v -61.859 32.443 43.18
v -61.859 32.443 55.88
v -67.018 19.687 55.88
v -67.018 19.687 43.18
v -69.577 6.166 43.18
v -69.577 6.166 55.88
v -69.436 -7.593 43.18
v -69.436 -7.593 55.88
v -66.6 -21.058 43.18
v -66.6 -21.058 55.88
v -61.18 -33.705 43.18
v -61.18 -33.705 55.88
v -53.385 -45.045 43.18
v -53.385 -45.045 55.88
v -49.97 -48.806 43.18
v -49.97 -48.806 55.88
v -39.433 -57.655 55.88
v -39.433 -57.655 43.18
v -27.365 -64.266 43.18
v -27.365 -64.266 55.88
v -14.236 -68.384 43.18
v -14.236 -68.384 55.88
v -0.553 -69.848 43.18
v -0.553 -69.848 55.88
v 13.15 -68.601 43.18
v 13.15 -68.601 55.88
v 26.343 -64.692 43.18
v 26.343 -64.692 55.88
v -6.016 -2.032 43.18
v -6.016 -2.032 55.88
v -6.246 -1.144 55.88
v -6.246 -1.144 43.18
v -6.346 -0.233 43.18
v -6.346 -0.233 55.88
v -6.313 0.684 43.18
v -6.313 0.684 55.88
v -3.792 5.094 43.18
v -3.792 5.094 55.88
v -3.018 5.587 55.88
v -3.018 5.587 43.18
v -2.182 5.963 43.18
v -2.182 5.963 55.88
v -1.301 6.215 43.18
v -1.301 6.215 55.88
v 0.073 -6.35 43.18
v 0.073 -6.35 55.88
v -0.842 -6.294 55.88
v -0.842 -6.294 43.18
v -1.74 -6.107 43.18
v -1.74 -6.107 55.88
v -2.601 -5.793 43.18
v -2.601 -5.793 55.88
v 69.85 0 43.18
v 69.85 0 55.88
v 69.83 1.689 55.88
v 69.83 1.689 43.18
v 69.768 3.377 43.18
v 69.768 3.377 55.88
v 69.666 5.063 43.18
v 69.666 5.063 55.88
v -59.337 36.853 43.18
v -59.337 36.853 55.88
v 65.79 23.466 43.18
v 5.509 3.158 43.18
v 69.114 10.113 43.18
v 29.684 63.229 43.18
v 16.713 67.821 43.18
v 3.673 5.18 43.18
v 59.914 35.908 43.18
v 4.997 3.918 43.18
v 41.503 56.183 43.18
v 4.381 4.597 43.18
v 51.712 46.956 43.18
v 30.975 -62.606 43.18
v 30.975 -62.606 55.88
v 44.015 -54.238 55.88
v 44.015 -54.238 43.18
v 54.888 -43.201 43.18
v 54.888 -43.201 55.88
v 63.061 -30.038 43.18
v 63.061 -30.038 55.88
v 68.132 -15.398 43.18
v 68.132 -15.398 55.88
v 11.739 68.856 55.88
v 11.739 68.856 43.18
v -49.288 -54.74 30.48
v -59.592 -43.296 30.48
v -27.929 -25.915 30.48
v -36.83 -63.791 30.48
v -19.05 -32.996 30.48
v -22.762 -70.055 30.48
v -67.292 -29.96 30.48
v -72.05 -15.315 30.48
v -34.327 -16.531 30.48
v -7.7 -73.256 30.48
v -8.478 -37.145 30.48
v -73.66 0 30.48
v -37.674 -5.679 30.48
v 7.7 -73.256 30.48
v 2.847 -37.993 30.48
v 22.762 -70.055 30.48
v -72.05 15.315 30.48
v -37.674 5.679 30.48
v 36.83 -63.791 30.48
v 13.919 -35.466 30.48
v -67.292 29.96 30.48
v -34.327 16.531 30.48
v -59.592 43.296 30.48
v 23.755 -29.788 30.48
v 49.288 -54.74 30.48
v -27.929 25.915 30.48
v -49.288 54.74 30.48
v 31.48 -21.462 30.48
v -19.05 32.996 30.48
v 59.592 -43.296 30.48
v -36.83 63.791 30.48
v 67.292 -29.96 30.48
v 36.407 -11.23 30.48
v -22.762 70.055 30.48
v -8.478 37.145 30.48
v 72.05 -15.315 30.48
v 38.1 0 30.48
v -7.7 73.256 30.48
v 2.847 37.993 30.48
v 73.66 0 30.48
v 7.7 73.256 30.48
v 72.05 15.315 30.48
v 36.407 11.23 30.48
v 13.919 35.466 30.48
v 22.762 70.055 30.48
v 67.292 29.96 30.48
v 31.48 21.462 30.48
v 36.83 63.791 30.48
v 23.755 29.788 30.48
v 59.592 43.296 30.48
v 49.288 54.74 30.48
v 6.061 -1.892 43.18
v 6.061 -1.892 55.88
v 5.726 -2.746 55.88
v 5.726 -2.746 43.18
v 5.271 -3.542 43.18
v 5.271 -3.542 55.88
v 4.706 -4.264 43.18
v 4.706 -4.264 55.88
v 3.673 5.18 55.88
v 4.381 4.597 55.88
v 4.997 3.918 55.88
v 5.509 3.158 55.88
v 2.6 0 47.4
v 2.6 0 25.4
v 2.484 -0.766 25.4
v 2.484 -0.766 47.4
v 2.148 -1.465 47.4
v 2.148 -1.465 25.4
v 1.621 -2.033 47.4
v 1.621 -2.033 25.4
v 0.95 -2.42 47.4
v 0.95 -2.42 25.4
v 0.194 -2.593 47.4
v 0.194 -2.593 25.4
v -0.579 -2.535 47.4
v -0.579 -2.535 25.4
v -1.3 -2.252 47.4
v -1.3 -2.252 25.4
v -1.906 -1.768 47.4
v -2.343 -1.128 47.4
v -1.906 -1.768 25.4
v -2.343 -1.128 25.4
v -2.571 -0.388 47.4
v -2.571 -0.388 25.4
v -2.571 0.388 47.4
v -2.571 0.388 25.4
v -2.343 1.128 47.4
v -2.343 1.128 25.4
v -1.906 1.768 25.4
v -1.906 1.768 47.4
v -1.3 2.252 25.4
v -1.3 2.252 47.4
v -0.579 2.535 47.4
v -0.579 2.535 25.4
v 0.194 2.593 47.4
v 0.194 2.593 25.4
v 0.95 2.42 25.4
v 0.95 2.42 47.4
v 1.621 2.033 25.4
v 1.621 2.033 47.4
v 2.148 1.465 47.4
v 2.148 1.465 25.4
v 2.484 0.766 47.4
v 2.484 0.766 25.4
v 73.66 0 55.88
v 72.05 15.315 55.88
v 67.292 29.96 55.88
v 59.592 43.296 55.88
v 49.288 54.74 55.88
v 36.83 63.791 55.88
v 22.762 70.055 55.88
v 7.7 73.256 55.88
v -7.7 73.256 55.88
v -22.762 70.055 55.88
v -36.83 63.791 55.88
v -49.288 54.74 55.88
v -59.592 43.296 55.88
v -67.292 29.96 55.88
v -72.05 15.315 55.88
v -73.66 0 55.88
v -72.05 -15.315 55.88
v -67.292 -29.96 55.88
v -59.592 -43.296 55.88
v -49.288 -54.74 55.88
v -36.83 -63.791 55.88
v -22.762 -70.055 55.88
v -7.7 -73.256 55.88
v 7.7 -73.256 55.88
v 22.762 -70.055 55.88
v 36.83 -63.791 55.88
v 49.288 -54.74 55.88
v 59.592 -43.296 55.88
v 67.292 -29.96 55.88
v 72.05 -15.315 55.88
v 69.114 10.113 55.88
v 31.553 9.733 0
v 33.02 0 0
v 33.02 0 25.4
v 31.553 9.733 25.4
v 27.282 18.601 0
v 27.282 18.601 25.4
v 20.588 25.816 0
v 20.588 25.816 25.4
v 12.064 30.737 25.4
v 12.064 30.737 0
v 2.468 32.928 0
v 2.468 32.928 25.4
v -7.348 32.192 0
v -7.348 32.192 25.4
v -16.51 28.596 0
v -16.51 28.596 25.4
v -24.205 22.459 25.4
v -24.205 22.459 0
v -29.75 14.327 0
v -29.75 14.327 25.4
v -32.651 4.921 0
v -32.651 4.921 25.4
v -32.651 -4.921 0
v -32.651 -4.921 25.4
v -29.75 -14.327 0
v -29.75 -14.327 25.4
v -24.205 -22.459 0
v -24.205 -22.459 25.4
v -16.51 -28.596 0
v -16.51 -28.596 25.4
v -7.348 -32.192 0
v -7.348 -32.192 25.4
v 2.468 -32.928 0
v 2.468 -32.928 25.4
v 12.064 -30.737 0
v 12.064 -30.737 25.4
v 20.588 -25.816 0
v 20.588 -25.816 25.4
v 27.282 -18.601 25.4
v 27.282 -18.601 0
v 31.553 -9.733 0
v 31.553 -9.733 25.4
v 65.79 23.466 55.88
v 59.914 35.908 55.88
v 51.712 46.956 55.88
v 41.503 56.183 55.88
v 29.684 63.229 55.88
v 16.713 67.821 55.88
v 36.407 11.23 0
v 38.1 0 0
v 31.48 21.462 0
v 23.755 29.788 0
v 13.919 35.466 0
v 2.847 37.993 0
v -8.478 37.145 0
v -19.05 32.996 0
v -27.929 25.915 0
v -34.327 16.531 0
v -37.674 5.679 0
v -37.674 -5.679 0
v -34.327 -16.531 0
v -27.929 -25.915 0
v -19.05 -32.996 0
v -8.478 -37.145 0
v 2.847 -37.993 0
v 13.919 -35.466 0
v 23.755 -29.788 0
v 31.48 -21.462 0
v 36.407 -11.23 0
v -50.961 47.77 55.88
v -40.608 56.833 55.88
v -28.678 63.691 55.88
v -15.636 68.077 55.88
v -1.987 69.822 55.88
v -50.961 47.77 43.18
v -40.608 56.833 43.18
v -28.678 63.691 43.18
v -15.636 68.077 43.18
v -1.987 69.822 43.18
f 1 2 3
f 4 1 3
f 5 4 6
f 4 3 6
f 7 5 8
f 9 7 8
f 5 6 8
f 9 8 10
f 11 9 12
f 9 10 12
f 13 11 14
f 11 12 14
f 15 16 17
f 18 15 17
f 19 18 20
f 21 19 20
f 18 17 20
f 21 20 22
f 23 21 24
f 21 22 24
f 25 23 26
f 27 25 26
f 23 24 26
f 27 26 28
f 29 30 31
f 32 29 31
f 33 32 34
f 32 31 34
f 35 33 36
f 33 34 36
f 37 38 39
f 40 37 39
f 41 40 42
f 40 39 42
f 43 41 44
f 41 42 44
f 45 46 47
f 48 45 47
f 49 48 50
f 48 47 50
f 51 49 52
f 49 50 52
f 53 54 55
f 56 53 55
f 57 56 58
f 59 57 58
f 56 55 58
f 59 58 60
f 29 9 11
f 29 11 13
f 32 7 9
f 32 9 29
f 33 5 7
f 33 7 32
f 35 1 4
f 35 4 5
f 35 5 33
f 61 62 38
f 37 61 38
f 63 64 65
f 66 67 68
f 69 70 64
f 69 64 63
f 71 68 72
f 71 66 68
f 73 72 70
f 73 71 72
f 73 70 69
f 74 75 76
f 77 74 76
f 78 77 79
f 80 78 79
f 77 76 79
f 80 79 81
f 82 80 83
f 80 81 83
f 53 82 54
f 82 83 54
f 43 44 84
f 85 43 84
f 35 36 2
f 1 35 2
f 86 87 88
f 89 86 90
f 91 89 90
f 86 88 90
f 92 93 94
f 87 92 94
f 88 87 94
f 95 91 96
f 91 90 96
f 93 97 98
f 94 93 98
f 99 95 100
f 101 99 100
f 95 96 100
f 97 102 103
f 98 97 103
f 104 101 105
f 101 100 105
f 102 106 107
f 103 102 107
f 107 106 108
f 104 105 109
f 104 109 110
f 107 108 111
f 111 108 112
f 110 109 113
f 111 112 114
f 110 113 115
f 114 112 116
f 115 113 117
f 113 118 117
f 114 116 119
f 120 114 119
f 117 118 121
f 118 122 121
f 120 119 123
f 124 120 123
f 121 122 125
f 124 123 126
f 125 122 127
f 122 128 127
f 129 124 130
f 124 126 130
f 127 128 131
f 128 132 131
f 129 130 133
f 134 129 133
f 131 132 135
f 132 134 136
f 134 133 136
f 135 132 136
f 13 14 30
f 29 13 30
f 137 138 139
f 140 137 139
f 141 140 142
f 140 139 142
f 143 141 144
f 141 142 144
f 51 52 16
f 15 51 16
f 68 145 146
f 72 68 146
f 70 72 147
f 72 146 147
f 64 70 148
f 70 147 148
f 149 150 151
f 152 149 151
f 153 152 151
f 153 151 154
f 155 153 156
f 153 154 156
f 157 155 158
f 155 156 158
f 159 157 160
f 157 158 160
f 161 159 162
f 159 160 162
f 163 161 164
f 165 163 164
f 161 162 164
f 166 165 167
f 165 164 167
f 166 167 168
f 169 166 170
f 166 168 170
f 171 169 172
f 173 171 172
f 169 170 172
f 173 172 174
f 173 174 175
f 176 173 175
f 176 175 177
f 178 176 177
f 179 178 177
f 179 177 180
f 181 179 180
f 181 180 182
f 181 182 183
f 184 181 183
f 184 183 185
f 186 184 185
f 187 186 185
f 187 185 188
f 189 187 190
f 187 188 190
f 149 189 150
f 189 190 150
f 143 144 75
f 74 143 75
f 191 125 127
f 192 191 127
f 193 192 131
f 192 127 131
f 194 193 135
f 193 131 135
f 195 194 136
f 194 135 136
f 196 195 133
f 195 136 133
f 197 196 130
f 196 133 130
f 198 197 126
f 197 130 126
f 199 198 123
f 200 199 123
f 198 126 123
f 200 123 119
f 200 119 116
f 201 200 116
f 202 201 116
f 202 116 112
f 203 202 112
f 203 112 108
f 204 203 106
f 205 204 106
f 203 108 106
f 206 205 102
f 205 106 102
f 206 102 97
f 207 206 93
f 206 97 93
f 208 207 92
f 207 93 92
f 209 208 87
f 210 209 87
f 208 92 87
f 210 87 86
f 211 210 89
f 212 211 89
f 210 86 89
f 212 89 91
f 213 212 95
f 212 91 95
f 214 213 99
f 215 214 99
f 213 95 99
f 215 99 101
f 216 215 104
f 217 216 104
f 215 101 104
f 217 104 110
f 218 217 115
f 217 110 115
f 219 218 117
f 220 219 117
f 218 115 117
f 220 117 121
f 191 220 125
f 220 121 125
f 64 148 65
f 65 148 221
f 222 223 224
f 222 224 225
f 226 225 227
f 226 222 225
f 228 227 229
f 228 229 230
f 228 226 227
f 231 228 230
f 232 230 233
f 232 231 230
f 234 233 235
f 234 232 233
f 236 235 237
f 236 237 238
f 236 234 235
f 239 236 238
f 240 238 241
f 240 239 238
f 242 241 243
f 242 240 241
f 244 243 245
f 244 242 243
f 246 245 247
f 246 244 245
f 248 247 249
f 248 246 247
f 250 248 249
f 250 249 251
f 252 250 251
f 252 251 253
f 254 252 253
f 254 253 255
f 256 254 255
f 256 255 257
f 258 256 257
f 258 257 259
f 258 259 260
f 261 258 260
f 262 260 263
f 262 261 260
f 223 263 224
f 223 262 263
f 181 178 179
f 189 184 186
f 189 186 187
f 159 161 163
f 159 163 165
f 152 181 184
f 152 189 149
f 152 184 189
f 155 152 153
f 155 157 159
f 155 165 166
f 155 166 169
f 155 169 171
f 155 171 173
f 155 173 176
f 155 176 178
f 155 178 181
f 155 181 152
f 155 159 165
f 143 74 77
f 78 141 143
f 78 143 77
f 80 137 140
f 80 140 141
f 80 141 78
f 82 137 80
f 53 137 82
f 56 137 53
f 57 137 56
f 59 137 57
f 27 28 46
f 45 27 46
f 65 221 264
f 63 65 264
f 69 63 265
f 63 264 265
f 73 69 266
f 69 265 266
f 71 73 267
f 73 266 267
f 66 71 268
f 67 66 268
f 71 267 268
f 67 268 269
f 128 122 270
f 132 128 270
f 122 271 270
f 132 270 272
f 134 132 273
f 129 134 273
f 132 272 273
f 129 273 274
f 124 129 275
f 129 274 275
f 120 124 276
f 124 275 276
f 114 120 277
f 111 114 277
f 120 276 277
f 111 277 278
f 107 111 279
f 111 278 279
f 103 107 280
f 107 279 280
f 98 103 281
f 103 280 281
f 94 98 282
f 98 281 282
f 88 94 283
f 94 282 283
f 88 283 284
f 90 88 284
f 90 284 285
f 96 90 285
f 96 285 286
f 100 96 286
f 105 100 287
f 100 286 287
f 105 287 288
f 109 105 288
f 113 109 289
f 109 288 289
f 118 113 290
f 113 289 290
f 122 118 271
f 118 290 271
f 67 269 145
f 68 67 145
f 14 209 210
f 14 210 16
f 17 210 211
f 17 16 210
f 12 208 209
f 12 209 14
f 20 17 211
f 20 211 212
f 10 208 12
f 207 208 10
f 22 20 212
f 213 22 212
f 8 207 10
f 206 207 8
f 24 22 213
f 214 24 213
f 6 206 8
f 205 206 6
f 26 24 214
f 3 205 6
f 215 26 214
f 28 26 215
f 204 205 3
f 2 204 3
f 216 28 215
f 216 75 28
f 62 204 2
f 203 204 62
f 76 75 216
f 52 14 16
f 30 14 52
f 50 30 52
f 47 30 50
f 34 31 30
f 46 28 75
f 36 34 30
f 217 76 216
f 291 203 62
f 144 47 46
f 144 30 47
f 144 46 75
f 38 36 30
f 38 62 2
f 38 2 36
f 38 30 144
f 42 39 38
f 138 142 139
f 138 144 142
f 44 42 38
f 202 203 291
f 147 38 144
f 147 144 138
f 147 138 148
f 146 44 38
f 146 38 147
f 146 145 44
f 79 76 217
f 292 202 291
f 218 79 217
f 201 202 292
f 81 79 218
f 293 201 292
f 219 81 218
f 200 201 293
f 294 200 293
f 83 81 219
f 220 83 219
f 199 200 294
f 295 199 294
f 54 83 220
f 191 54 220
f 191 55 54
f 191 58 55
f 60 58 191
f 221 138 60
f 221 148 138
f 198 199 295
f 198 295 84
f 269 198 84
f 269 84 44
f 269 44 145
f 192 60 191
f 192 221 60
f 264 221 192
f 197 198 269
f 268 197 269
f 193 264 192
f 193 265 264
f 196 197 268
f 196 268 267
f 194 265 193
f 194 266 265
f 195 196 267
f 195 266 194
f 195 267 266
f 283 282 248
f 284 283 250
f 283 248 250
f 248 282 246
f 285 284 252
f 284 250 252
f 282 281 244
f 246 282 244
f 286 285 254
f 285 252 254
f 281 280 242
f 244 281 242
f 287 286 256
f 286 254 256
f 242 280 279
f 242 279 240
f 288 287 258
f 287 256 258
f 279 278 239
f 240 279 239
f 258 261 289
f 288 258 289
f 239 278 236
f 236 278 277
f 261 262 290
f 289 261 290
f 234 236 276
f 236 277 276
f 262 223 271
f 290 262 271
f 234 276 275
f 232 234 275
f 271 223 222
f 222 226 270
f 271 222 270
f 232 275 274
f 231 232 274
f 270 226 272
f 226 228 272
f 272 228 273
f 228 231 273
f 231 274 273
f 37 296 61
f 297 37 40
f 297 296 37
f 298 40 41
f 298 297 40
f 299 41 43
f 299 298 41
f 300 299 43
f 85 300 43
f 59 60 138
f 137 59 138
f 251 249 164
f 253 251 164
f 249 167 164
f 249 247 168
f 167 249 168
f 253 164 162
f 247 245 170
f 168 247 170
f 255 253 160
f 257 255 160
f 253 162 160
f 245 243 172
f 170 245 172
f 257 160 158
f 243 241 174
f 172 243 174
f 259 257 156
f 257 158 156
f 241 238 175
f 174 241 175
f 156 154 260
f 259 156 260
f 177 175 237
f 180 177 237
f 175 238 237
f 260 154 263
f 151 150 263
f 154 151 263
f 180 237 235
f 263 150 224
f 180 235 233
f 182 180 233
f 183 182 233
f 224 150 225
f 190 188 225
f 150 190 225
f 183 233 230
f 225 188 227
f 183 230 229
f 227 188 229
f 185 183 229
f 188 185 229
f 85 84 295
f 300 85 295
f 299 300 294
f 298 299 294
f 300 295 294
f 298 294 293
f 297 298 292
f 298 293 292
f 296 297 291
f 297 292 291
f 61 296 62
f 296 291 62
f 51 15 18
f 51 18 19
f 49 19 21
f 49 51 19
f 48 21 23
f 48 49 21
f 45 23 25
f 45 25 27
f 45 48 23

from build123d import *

# Parameters (mm, degrees)
F0_R     = 38.1
F0_R_2   = 33.02
F1_DEPTH = 25.4
F2_R     = 38.1
F3_DEPTH = 5.08
F4_R     = 73.66
F4_R_2   = 38.1
F5_DEPTH = 25.4
F7_DEPTH = 12.7
F8_R     = 2.5999948
F9_DEPTH = 22.0000068


with BuildPart() as f1:
    # F0 (on Top) → F1 (new body)
    with BuildSketch(Plane.XY):
        Circle(F0_R)
        Circle(F0_R_2, mode=Mode.SUBTRACT)
    extrude(amount=F1_DEPTH)

    # F2 (on face) → F3 (join)
    with BuildSketch(Plane.XY.offset(25.4)):
        Circle(F2_R)
    extrude(amount=F3_DEPTH)

    # F4 (on face) → F5 (join)
    with BuildSketch(Plane.XY.offset(30.48)):
        Circle(F4_R)
        Circle(F4_R_2, mode=Mode.SUBTRACT)
        Circle(F4_R_2)
    extrude(amount=F5_DEPTH)

    # F6 (on face) → F7 (cut)
    with BuildSketch(Plane.XY.offset(55.88)):
        with BuildLine():
            Line((-53.3851905178, -45.0449101829), (-6.0161168891, -2.0319541275))
            ThreePointArc((-6.0161168891, -2.0319541275), (-6.3123702779, -0.6902763759), (-6.3130838426, 0.6837195304))
            Line((-6.3130838426, 0.6837195304), (-61.8586847432, 32.4426512763))
            ThreePointArc((-61.8586847432, 32.4426512763), (-69.4360730566, -7.5930401345), (-53.3851905178, -45.0449101829))
        make_face()
        with BuildLine():
            ThreePointArc((-3.7915855726, 5.093758813), (-2.607121536, 5.7901137551), (-1.3005942796, 6.2153804807))
            Line((-1.3005942796, 6.2153804807), (11.7394100669, 68.8564358015))
            ThreePointArc((11.7394100669, 68.8564358015), (-28.6783368956, 63.6912513058), (-59.3371864733, 36.852690559))
            Line((-59.3371864733, 36.852690559), (-3.7915855726, 5.093758813))
        make_face()
        with BuildLine():
            ThreePointArc((3.672788134, 5.1800702044), (4.7010805558, 4.2687634752), (5.5092723722, 3.1575968597))
            Line((5.5092723722, 3.1575968597), (69.1140391724, 10.1129663932))
            ThreePointArc((69.1140391724, 10.1129663932), (51.7118861143, 46.9563982275), (16.7127924805, 67.8211255252))
            Line((16.7127924805, 67.8211255252), (3.672788134, 5.1800702044))
        make_face()
        with BuildLine():
            Line((69.6662602731, 5.0630701709), (6.0614934729, -1.8922993626))
            ThreePointArc((6.0614934729, -1.8922993626), (5.5125491033, -3.1518728375), (4.7055118589, -4.2638782986))
            Line((4.7055118589, -4.2638782986), (30.9754152415, -62.6062788434))
            ThreePointArc((30.9754152415, -62.6062788434), (59.3407754188, -36.8469113046), (69.85, 0))
            ThreePointArc((69.85, 0), (69.8040499544, 2.5332015239), (69.6662602731, 5.0630701709))
        make_face()
        with BuildLine():
            Line((26.3433242374, -64.6919760722), (0.0734208549, -6.3495755274))
            ThreePointArc((0.0734208549, -6.3495755274), (-1.2941378453, -6.216728017), (-2.601106109, -5.7928185722))
            Line((-2.601106109, -5.7928185722), (-49.9701797376, -48.8057746275))
            ThreePointArc((-49.9701797376, -48.8057746275), (-14.2355162987, -68.3840081869), (26.3433242374, -64.6919760722))
        make_face()
    extrude(amount=-F7_DEPTH, mode=Mode.SUBTRACT)

    # F8 (on face) → F9 (cut)
    with BuildSketch(Plane(origin=(0, 0, 25.4), x_dir=(1, 0, 0), z_dir=(0, 0, -1))):
        Circle(F8_R)
    extrude(amount=-F9_DEPTH, mode=Mode.SUBTRACT)


solid = f1.part
